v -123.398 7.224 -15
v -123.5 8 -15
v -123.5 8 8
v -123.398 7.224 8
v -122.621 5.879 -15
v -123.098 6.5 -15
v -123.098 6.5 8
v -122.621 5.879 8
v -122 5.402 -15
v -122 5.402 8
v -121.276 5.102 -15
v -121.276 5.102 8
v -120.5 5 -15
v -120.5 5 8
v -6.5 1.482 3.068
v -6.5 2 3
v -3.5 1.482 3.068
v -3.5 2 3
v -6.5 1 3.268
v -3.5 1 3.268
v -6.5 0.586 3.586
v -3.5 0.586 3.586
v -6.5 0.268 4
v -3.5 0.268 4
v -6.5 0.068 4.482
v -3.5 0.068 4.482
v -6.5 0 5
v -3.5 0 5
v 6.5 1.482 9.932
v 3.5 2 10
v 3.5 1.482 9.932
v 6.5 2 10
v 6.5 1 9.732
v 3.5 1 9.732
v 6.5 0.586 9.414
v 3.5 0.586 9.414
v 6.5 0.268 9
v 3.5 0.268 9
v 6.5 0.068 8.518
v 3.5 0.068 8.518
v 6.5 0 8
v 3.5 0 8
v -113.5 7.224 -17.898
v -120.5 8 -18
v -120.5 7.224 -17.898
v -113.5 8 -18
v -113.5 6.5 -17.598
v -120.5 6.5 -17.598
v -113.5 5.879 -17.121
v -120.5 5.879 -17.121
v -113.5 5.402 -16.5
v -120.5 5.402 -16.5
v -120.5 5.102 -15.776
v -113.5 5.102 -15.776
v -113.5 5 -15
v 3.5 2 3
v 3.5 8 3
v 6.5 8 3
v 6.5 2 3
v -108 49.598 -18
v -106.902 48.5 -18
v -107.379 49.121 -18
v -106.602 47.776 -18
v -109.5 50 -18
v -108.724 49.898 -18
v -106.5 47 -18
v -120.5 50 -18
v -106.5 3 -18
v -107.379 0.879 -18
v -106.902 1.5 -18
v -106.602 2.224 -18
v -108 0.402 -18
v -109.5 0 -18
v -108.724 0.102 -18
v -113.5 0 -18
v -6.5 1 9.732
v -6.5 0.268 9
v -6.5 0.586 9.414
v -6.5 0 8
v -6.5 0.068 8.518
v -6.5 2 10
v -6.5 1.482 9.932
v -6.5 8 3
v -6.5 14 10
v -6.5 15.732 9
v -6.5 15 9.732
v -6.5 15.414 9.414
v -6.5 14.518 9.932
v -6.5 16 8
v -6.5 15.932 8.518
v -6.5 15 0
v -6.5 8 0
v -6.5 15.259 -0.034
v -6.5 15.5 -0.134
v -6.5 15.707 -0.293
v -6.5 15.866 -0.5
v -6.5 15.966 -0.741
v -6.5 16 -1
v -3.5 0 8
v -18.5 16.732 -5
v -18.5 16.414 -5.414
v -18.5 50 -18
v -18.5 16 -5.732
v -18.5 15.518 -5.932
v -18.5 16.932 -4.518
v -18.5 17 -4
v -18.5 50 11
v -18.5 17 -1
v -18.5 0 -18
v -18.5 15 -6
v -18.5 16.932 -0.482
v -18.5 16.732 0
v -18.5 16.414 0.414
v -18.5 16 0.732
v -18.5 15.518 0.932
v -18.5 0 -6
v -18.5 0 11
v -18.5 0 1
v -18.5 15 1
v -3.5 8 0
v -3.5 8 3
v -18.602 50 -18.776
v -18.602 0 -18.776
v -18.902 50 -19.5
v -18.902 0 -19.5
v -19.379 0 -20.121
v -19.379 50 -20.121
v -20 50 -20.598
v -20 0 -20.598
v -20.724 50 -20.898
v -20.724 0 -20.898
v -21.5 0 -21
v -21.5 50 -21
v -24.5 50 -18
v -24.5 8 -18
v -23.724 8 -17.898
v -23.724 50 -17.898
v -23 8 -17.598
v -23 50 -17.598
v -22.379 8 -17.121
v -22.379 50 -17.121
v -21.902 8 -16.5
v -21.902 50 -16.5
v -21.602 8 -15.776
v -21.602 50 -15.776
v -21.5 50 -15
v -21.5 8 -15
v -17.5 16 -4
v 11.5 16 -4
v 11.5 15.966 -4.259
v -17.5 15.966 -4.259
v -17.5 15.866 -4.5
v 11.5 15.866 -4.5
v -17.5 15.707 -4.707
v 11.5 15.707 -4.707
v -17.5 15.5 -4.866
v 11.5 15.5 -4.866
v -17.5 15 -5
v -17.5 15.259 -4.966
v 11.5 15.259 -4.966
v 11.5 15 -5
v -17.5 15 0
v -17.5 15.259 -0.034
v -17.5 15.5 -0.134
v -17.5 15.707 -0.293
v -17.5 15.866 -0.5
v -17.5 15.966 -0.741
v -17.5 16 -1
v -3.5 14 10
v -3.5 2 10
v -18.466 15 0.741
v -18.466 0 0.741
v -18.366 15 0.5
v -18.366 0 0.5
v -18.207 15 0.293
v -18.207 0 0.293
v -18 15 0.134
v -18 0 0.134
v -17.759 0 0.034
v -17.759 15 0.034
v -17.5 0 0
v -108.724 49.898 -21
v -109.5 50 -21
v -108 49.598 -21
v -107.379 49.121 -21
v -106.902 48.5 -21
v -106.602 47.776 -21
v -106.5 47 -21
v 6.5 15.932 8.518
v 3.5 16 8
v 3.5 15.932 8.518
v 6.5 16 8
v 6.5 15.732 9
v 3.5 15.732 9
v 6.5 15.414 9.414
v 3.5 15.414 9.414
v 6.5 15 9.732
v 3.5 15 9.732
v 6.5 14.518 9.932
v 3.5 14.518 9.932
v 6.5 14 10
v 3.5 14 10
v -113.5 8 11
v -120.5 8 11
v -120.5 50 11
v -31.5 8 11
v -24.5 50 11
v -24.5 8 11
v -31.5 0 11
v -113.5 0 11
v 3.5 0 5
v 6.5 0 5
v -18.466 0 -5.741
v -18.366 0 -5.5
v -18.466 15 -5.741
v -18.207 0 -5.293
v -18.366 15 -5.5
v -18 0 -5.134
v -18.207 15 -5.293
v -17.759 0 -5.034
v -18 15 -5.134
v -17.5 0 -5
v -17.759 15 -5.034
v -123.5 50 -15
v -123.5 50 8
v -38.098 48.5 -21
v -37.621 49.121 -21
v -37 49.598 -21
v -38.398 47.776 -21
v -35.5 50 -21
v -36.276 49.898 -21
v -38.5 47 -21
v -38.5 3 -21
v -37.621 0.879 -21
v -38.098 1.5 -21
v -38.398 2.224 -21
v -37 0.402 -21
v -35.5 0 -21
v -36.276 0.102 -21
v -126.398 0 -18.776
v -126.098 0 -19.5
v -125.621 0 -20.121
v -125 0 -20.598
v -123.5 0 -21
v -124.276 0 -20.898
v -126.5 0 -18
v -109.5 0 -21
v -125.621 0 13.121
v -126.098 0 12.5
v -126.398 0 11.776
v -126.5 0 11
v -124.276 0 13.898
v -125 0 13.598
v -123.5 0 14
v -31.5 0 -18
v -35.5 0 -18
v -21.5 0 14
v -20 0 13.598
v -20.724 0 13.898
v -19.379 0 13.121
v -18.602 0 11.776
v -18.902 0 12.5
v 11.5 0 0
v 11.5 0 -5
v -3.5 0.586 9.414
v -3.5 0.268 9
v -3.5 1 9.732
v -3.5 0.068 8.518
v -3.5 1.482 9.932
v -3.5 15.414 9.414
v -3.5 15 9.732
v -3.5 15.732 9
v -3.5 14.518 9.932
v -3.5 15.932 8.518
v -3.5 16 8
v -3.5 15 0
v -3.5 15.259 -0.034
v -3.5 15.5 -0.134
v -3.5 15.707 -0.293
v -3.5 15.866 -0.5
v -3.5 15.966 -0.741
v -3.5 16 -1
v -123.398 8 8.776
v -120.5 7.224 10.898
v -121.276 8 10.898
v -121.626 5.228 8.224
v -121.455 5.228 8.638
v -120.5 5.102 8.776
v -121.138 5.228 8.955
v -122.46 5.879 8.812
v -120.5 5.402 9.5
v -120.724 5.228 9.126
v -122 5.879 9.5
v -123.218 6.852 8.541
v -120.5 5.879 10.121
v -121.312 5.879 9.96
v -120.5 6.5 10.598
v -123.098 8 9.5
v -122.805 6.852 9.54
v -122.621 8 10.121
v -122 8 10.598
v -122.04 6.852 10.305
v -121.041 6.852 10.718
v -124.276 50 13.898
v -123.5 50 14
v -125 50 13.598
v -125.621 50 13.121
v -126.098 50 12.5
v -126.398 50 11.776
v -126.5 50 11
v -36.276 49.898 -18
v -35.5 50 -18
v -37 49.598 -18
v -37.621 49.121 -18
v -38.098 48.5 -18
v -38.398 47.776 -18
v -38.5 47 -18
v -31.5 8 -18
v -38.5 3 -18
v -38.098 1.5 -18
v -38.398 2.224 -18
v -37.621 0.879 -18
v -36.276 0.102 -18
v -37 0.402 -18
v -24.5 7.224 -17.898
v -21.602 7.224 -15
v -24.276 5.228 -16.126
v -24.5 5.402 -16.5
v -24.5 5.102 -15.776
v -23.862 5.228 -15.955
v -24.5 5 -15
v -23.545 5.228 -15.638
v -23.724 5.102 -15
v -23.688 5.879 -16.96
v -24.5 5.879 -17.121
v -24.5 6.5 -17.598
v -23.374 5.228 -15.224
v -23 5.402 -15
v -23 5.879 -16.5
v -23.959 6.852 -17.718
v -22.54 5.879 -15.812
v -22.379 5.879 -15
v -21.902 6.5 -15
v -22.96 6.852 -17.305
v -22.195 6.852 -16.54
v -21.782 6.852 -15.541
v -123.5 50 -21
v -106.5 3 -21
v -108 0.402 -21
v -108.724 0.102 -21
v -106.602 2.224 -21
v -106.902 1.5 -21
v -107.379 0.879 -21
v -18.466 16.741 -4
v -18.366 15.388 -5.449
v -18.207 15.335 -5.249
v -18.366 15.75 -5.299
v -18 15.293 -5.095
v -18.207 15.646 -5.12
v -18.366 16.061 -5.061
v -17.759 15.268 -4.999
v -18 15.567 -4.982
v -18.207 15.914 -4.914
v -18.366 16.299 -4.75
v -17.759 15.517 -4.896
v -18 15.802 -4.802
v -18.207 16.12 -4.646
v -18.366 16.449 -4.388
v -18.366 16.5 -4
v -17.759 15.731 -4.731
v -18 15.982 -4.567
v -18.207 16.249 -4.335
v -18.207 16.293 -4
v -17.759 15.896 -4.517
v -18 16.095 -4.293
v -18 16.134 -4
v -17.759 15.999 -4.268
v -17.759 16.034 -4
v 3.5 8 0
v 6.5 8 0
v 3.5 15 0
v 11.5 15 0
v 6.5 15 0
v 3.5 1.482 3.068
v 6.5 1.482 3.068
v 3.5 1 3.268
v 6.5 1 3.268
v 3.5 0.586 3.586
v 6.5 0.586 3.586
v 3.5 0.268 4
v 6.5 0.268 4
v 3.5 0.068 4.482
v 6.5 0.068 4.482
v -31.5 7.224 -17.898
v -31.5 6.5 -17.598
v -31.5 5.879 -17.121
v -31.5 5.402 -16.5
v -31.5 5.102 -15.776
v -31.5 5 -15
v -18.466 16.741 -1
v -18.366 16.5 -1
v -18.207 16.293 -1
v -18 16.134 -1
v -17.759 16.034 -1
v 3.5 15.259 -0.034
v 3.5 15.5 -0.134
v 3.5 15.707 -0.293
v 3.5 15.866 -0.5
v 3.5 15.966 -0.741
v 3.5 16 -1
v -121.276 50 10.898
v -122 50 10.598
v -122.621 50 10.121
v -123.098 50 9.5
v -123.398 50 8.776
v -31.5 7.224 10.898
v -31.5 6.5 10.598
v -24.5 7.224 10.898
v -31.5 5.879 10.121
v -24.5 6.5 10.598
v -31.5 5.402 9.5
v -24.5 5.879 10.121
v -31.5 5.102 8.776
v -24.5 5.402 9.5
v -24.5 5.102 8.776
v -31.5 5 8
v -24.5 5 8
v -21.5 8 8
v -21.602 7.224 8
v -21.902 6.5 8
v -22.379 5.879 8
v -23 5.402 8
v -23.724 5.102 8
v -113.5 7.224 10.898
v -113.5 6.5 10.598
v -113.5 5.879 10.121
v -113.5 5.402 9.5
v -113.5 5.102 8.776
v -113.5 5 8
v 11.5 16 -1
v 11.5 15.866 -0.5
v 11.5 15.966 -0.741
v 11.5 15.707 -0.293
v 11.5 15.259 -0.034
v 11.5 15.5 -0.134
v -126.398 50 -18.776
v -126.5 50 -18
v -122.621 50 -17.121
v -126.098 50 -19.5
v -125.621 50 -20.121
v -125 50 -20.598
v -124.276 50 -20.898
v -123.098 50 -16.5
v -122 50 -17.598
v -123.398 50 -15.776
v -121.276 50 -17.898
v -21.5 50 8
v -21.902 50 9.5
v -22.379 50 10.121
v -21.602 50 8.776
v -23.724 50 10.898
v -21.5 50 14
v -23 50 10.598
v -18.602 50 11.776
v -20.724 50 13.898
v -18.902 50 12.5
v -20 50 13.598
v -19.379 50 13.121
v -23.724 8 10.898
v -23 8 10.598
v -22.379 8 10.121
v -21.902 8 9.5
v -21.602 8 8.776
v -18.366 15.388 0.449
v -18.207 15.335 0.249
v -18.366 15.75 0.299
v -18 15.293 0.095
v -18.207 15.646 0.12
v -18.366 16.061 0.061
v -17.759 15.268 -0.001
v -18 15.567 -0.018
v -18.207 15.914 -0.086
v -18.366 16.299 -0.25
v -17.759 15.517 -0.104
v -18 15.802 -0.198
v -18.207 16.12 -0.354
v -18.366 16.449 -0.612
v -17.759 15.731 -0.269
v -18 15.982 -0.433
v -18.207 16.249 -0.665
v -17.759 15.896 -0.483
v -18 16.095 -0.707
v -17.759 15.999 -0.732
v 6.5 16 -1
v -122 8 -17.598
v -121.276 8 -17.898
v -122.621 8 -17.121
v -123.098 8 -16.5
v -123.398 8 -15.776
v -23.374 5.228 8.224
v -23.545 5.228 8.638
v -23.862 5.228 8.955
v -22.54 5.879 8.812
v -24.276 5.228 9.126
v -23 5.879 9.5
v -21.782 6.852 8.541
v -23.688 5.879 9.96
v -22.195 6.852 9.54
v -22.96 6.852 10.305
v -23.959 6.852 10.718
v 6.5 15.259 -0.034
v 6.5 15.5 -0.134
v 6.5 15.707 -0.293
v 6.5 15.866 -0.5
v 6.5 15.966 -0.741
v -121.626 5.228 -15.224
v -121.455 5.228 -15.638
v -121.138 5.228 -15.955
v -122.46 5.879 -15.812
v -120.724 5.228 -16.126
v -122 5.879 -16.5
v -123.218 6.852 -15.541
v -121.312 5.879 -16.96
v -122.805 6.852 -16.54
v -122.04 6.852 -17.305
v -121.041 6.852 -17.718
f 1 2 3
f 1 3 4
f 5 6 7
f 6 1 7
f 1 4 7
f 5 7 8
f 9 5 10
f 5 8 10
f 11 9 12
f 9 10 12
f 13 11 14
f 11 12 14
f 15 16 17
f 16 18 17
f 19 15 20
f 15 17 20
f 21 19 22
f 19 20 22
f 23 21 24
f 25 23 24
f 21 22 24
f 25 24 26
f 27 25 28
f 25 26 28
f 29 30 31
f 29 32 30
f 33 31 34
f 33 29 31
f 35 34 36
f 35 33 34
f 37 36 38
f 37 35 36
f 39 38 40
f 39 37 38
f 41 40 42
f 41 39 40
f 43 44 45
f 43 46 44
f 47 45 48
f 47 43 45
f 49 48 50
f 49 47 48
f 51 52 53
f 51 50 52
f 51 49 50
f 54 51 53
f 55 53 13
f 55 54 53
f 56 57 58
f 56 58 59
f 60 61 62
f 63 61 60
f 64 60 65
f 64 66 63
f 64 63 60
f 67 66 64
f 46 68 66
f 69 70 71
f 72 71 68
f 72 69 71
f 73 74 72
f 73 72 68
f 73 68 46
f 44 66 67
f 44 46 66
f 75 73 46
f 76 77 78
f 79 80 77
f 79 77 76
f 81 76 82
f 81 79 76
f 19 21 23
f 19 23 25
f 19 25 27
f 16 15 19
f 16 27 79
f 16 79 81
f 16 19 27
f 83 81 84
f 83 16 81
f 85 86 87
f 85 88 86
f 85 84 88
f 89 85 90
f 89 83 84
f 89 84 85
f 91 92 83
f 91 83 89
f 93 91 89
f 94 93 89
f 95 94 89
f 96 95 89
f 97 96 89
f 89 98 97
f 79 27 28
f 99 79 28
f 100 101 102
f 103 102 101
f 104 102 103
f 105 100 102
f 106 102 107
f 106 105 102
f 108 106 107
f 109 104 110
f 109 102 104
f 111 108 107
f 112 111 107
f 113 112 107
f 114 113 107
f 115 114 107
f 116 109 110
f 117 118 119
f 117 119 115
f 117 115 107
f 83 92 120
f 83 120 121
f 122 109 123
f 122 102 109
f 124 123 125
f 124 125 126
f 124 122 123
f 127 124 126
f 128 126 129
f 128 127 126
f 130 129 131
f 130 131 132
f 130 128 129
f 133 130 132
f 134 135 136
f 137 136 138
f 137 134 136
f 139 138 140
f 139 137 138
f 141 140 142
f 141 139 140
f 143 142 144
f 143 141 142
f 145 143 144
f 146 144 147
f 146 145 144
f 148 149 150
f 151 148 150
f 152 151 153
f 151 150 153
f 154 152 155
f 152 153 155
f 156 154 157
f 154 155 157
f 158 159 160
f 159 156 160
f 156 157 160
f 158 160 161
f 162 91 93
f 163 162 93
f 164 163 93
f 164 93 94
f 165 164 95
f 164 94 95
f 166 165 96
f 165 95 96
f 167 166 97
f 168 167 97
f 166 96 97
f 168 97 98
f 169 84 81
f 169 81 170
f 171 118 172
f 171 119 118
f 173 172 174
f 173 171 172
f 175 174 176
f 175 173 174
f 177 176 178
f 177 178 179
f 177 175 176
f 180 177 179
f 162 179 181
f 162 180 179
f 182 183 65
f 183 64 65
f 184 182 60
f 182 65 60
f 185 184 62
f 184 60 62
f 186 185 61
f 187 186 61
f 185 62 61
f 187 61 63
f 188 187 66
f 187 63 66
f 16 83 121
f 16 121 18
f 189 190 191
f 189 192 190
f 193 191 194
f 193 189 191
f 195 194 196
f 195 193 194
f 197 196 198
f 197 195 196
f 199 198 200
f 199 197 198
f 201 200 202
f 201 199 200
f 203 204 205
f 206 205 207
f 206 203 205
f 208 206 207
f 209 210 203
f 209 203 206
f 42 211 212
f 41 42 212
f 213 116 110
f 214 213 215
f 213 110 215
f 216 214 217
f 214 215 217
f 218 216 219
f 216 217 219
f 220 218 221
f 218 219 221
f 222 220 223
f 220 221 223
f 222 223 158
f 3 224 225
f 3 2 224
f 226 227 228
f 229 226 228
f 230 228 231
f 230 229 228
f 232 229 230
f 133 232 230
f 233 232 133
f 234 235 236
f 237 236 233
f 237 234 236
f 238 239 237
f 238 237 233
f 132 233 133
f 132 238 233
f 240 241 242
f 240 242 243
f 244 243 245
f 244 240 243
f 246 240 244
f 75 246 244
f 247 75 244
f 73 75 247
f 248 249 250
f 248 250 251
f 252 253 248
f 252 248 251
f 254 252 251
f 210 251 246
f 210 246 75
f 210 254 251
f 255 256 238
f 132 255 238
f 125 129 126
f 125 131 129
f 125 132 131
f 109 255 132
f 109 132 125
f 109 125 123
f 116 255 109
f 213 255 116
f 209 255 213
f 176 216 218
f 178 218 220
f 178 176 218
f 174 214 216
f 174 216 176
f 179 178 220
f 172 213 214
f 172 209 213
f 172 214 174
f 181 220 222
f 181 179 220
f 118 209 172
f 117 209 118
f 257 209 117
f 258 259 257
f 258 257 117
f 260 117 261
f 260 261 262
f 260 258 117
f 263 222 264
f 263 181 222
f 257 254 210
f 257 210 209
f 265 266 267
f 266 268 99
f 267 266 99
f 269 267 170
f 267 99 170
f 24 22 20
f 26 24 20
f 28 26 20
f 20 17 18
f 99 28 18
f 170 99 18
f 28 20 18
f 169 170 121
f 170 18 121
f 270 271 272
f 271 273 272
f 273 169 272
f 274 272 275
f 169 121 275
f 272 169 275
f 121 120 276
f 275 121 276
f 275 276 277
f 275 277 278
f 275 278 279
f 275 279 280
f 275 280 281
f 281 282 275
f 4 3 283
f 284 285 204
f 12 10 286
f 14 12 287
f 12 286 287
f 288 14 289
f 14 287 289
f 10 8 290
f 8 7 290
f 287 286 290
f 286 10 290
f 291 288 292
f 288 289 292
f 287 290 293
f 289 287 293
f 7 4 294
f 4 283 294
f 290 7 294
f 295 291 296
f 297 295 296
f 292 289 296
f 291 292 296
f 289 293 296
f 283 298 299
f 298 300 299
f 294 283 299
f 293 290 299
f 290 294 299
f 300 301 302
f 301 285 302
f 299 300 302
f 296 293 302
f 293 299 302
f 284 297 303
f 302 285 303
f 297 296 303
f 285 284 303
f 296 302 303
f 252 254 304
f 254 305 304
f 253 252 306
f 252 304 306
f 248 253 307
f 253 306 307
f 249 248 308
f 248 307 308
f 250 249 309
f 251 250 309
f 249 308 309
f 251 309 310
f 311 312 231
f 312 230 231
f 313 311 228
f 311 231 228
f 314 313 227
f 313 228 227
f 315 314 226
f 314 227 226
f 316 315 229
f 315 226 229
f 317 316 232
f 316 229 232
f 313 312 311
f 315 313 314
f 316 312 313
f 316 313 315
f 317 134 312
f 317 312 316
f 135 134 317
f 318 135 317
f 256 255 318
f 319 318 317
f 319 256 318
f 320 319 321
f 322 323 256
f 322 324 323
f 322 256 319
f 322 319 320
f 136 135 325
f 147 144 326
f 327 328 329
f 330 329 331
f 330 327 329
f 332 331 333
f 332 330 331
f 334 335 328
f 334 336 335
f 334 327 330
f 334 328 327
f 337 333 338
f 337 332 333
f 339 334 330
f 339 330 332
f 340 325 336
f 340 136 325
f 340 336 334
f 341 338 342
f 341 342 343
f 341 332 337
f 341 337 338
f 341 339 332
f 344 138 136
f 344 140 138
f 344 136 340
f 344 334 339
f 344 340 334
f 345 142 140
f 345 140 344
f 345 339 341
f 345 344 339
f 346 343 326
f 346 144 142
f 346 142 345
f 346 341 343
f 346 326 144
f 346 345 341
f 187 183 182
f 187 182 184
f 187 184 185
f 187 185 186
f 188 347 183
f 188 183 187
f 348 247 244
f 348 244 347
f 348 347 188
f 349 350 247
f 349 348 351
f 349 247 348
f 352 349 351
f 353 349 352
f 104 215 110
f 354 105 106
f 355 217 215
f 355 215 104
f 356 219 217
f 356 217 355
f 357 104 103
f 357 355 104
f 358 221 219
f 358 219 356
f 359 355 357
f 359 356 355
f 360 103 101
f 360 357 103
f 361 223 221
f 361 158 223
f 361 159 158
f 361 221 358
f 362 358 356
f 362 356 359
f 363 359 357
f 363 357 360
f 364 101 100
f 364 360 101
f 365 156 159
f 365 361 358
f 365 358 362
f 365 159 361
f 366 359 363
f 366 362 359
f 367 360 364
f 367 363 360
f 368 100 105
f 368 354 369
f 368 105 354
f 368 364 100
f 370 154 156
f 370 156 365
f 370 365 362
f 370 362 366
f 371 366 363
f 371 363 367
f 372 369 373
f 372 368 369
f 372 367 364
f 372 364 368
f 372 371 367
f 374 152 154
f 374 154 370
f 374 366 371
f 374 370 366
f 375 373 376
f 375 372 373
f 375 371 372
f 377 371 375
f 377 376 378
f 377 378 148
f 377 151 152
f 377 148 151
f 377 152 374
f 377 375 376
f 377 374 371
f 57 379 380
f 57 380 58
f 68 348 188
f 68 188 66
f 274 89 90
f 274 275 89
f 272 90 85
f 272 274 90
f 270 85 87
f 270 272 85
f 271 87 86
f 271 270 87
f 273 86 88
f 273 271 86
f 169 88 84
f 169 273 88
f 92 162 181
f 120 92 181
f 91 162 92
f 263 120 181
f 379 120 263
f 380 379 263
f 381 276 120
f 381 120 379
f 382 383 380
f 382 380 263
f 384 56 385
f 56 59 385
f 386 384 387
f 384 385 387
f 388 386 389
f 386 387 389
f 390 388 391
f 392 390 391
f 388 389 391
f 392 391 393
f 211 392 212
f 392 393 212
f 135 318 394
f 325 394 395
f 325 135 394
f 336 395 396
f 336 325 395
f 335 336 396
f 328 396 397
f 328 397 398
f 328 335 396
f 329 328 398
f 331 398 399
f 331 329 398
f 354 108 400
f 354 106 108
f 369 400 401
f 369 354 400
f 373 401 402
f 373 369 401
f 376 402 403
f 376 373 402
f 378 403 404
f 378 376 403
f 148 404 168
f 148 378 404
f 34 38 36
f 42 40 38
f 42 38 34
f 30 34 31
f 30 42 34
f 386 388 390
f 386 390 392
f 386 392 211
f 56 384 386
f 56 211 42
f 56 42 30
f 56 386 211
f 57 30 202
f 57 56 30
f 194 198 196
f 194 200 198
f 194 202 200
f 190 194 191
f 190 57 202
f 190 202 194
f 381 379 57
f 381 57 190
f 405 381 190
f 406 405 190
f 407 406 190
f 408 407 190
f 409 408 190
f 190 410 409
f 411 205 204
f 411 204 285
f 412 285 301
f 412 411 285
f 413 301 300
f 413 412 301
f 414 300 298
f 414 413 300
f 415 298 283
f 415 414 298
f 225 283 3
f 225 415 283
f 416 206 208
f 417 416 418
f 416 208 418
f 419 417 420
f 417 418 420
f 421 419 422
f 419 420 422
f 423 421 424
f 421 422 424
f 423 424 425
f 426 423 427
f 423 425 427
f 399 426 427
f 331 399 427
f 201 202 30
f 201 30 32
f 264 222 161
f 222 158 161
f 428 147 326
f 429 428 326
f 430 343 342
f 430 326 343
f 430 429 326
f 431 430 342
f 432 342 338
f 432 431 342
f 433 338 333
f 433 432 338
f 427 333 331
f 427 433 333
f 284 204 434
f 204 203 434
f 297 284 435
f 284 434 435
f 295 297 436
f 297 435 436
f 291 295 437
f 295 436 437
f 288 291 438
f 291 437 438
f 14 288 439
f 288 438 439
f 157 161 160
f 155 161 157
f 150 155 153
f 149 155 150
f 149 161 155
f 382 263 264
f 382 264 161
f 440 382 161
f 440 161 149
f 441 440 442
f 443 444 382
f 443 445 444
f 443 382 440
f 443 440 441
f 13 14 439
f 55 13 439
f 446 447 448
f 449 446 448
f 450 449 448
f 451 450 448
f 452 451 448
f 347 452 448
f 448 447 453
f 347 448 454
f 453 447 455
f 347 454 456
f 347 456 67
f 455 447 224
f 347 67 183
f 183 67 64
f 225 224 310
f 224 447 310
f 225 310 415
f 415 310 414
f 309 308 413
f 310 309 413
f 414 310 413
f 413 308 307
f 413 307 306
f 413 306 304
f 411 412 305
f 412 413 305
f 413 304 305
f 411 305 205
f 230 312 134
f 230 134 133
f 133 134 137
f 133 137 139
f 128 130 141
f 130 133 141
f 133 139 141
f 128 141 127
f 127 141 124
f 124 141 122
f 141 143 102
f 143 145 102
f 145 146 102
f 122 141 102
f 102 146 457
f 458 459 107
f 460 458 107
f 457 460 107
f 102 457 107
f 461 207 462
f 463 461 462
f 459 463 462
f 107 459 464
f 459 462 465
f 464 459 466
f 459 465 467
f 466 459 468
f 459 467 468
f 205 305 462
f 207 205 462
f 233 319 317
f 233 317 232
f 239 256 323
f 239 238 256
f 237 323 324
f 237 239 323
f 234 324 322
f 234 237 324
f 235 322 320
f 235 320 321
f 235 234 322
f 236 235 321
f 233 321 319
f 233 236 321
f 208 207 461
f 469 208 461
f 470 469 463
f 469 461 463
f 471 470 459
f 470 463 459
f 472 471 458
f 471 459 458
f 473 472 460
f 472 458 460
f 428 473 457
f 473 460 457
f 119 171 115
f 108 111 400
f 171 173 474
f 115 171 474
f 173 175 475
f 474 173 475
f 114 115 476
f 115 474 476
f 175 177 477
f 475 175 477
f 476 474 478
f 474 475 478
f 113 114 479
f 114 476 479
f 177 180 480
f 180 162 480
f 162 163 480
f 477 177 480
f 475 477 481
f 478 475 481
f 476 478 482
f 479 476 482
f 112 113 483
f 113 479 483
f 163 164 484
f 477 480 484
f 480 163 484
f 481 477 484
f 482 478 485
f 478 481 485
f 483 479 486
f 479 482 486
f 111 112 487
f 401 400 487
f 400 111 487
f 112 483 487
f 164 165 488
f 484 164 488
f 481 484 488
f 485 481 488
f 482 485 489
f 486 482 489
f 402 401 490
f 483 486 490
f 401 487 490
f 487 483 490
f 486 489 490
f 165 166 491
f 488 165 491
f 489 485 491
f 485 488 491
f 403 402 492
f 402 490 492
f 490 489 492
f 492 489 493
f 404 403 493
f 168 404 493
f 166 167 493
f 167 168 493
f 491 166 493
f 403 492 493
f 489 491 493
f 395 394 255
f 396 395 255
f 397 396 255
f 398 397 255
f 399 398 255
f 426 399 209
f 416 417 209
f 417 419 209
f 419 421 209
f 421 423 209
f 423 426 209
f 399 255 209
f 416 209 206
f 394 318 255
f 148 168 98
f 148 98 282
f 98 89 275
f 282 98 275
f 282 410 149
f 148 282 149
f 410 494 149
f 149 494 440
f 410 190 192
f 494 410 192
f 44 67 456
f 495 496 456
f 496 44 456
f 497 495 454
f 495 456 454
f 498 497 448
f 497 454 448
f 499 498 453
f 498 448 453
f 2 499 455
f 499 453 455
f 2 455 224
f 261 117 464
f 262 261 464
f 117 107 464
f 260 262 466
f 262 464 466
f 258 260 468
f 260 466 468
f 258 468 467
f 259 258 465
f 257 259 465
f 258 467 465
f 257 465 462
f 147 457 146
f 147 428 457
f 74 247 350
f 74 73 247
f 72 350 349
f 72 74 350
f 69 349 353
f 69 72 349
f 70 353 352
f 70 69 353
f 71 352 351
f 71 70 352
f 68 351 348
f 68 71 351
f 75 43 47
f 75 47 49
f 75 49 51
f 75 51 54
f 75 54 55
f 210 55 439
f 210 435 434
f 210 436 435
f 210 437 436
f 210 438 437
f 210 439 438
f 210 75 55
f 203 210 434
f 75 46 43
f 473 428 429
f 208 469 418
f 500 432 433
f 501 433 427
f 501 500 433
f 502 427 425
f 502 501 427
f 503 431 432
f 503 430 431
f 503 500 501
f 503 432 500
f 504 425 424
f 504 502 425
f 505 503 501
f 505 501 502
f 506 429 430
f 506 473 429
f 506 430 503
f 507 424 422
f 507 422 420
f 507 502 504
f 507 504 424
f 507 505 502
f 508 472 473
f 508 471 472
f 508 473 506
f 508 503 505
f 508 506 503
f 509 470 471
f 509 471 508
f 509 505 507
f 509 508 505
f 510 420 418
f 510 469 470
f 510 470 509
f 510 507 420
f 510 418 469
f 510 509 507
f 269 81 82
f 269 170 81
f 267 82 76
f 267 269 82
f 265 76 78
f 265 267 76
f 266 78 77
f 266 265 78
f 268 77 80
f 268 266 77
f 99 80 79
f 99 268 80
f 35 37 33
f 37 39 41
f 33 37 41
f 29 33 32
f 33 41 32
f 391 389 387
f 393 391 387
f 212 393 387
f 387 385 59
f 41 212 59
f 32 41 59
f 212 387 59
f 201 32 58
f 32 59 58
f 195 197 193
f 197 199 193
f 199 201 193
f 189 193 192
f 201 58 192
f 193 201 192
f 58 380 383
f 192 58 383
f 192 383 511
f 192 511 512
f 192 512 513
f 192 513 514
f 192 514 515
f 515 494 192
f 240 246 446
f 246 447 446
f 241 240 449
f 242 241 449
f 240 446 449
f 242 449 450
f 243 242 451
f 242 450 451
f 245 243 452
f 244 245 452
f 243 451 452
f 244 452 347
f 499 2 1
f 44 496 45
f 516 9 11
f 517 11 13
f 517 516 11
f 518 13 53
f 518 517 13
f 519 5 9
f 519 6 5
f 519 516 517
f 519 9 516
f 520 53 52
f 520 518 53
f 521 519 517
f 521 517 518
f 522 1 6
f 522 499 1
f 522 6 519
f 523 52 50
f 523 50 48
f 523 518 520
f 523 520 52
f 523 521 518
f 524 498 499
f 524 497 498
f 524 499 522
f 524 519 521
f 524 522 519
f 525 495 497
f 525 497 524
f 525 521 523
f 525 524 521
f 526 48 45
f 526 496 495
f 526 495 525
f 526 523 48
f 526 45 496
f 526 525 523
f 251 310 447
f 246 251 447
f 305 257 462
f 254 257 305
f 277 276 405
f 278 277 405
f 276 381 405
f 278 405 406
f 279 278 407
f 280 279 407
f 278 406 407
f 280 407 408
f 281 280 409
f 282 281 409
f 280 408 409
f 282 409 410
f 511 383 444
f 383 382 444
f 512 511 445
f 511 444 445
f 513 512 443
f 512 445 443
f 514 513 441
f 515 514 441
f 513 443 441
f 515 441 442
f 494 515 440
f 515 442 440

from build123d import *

# Parameters (mm, degrees)
F0_W     = 3
F0_H     = 16
F1_DEPTH = 10
F2_W     = 8
F2_H     = 3
F3_DEPTH = 25
F4_W     = 30
F4_H     = 16
F5_DEPTH = 5
F7_DEPTH = 50
F6_W     = 10
F6_H     = 29
F8_DEPTH = 5
F9_R     = 2
F10_R    = 3
F11_R    = 1


with BuildPart() as f1:
    # F0 (on Top) → F1 (new body)
    with BuildSketch(Plane.XY):
        with Locations((-5, 8)):
            Rectangle(F0_W, F0_H)
    extrude(amount=F1_DEPTH)


with BuildPart() as f1b:
    # F0 (on Top) → F1, piece 2 (new body)
    with BuildSketch(Plane.XY):
        with Locations((5, 8)):
            Rectangle(F0_W, F0_H)
    extrude(amount=F1_DEPTH)


with BuildPart() as f3_tool:
    # F2 (on face) → F3 (new body)
    with BuildSketch(Plane(origin=(-6.5, 0, 0), x_dir=(0, -1, 0), z_dir=(-1, 0, 0))):
        with Locations((-4, 1.5)):
            Rectangle(F2_W, F2_H)
    extrude(amount=-F3_DEPTH)


with BuildPart() as f1_1:
    add(f1.part)

    # F3: cut by f3_tool
    add(f3_tool.part, mode=Mode.SUBTRACT)



with BuildPart() as f1b_1:
    add(f1b.part)

    # F3: cut by f3_tool
    add(f3_tool.part, mode=Mode.SUBTRACT)


with BuildPart() as f1_2:
    add(f1_1.part)

    add(f1b_1.part)  # F5 merges F1b
    # F4 (on Top) → F5 (join)
    with BuildSketch(Plane.XY):
        with Locations((-3.5, 8)):
            Rectangle(F4_W, F4_H)
    extrude(amount=-F5_DEPTH)

    # F6 (on Front) → F7 (join)
    with BuildSketch(Plane.XZ):
        Polygon((-113.5, -18), (-123.5, -18), (-123.5, 11), (-113.5, 11), (-31.5, 11), (-21.5, 11), (-21.5, -18), (-31.5, -18), (-38.5, -18), (-38.5, -21), (-18.5, -21), (-18.5, 14), (-126.5, 14), (-126.5, -21), (-106.5, -21), (-106.5, -18), align=None)
    extrude(amount=-F7_DEPTH)

    # F6 (on Front) → F8 (join)
    with BuildSketch(Plane.XZ):
        with Locations((-26.5, -3.5)):
            Rectangle(F6_W, F6_H)
        with Locations((-118.5, -3.5)):
            Rectangle(F6_W, F6_H)
    extrude(amount=-F8_DEPTH)

    # F9
    f9_edges = [f1_2.edges().sort_by_distance(p)[0] for p in [
        (-5, 16, 10),
        (5, 16, 10),
        (-5, 0, 10),
        (5, 0, 10),
        (-5, 0, 3),
        (5, 0, 3),
    ]]
    fillet(f9_edges, radius=F9_R)

    # F10
    f10_edges = [f1_2.edges().sort_by_distance(p)[0] for p in [
        (-21.5, 27.5, 11),
        (-123.5, 27.5, 11),
        (-126.5, 25, 14),
        (-18.5, 25, 14),
        (-18.5, 25, -21),
        (-21.5, 27.5, -18),
        (-123.5, 27.5, -18),
        (-126.5, 25, -21),
        (-123.5, 5, -3.5),
        (-118.5, 5, -18),
        (-26.5, 5, -18),
        (-21.5, 5, -3.5),
        (-26.5, 5, 11),
        (-118.5, 5, 11),
        (-38.5, 0, -19.5),
        (-106.5, 0, -19.5),
        (-38.5, 50, -19.5),
        (-106.5, 50, -19.5),
    ]]
    fillet(f10_edges, radius=F10_R)

    # F11
    f11_edges = [f1_2.edges().sort_by_distance(p)[0] for p in [
        (-18.5, 16, -2.5),
        (-3.5, 16, -5),
        (-12.5, 16, 0),
        (0, 16, 0),
        (9, 16, 0),
        (-18.5, 8, -5),
        (-18.5, 8, 0),
    ]]
    fillet(f11_edges, radius=F11_R)


solid = f1_2.part
